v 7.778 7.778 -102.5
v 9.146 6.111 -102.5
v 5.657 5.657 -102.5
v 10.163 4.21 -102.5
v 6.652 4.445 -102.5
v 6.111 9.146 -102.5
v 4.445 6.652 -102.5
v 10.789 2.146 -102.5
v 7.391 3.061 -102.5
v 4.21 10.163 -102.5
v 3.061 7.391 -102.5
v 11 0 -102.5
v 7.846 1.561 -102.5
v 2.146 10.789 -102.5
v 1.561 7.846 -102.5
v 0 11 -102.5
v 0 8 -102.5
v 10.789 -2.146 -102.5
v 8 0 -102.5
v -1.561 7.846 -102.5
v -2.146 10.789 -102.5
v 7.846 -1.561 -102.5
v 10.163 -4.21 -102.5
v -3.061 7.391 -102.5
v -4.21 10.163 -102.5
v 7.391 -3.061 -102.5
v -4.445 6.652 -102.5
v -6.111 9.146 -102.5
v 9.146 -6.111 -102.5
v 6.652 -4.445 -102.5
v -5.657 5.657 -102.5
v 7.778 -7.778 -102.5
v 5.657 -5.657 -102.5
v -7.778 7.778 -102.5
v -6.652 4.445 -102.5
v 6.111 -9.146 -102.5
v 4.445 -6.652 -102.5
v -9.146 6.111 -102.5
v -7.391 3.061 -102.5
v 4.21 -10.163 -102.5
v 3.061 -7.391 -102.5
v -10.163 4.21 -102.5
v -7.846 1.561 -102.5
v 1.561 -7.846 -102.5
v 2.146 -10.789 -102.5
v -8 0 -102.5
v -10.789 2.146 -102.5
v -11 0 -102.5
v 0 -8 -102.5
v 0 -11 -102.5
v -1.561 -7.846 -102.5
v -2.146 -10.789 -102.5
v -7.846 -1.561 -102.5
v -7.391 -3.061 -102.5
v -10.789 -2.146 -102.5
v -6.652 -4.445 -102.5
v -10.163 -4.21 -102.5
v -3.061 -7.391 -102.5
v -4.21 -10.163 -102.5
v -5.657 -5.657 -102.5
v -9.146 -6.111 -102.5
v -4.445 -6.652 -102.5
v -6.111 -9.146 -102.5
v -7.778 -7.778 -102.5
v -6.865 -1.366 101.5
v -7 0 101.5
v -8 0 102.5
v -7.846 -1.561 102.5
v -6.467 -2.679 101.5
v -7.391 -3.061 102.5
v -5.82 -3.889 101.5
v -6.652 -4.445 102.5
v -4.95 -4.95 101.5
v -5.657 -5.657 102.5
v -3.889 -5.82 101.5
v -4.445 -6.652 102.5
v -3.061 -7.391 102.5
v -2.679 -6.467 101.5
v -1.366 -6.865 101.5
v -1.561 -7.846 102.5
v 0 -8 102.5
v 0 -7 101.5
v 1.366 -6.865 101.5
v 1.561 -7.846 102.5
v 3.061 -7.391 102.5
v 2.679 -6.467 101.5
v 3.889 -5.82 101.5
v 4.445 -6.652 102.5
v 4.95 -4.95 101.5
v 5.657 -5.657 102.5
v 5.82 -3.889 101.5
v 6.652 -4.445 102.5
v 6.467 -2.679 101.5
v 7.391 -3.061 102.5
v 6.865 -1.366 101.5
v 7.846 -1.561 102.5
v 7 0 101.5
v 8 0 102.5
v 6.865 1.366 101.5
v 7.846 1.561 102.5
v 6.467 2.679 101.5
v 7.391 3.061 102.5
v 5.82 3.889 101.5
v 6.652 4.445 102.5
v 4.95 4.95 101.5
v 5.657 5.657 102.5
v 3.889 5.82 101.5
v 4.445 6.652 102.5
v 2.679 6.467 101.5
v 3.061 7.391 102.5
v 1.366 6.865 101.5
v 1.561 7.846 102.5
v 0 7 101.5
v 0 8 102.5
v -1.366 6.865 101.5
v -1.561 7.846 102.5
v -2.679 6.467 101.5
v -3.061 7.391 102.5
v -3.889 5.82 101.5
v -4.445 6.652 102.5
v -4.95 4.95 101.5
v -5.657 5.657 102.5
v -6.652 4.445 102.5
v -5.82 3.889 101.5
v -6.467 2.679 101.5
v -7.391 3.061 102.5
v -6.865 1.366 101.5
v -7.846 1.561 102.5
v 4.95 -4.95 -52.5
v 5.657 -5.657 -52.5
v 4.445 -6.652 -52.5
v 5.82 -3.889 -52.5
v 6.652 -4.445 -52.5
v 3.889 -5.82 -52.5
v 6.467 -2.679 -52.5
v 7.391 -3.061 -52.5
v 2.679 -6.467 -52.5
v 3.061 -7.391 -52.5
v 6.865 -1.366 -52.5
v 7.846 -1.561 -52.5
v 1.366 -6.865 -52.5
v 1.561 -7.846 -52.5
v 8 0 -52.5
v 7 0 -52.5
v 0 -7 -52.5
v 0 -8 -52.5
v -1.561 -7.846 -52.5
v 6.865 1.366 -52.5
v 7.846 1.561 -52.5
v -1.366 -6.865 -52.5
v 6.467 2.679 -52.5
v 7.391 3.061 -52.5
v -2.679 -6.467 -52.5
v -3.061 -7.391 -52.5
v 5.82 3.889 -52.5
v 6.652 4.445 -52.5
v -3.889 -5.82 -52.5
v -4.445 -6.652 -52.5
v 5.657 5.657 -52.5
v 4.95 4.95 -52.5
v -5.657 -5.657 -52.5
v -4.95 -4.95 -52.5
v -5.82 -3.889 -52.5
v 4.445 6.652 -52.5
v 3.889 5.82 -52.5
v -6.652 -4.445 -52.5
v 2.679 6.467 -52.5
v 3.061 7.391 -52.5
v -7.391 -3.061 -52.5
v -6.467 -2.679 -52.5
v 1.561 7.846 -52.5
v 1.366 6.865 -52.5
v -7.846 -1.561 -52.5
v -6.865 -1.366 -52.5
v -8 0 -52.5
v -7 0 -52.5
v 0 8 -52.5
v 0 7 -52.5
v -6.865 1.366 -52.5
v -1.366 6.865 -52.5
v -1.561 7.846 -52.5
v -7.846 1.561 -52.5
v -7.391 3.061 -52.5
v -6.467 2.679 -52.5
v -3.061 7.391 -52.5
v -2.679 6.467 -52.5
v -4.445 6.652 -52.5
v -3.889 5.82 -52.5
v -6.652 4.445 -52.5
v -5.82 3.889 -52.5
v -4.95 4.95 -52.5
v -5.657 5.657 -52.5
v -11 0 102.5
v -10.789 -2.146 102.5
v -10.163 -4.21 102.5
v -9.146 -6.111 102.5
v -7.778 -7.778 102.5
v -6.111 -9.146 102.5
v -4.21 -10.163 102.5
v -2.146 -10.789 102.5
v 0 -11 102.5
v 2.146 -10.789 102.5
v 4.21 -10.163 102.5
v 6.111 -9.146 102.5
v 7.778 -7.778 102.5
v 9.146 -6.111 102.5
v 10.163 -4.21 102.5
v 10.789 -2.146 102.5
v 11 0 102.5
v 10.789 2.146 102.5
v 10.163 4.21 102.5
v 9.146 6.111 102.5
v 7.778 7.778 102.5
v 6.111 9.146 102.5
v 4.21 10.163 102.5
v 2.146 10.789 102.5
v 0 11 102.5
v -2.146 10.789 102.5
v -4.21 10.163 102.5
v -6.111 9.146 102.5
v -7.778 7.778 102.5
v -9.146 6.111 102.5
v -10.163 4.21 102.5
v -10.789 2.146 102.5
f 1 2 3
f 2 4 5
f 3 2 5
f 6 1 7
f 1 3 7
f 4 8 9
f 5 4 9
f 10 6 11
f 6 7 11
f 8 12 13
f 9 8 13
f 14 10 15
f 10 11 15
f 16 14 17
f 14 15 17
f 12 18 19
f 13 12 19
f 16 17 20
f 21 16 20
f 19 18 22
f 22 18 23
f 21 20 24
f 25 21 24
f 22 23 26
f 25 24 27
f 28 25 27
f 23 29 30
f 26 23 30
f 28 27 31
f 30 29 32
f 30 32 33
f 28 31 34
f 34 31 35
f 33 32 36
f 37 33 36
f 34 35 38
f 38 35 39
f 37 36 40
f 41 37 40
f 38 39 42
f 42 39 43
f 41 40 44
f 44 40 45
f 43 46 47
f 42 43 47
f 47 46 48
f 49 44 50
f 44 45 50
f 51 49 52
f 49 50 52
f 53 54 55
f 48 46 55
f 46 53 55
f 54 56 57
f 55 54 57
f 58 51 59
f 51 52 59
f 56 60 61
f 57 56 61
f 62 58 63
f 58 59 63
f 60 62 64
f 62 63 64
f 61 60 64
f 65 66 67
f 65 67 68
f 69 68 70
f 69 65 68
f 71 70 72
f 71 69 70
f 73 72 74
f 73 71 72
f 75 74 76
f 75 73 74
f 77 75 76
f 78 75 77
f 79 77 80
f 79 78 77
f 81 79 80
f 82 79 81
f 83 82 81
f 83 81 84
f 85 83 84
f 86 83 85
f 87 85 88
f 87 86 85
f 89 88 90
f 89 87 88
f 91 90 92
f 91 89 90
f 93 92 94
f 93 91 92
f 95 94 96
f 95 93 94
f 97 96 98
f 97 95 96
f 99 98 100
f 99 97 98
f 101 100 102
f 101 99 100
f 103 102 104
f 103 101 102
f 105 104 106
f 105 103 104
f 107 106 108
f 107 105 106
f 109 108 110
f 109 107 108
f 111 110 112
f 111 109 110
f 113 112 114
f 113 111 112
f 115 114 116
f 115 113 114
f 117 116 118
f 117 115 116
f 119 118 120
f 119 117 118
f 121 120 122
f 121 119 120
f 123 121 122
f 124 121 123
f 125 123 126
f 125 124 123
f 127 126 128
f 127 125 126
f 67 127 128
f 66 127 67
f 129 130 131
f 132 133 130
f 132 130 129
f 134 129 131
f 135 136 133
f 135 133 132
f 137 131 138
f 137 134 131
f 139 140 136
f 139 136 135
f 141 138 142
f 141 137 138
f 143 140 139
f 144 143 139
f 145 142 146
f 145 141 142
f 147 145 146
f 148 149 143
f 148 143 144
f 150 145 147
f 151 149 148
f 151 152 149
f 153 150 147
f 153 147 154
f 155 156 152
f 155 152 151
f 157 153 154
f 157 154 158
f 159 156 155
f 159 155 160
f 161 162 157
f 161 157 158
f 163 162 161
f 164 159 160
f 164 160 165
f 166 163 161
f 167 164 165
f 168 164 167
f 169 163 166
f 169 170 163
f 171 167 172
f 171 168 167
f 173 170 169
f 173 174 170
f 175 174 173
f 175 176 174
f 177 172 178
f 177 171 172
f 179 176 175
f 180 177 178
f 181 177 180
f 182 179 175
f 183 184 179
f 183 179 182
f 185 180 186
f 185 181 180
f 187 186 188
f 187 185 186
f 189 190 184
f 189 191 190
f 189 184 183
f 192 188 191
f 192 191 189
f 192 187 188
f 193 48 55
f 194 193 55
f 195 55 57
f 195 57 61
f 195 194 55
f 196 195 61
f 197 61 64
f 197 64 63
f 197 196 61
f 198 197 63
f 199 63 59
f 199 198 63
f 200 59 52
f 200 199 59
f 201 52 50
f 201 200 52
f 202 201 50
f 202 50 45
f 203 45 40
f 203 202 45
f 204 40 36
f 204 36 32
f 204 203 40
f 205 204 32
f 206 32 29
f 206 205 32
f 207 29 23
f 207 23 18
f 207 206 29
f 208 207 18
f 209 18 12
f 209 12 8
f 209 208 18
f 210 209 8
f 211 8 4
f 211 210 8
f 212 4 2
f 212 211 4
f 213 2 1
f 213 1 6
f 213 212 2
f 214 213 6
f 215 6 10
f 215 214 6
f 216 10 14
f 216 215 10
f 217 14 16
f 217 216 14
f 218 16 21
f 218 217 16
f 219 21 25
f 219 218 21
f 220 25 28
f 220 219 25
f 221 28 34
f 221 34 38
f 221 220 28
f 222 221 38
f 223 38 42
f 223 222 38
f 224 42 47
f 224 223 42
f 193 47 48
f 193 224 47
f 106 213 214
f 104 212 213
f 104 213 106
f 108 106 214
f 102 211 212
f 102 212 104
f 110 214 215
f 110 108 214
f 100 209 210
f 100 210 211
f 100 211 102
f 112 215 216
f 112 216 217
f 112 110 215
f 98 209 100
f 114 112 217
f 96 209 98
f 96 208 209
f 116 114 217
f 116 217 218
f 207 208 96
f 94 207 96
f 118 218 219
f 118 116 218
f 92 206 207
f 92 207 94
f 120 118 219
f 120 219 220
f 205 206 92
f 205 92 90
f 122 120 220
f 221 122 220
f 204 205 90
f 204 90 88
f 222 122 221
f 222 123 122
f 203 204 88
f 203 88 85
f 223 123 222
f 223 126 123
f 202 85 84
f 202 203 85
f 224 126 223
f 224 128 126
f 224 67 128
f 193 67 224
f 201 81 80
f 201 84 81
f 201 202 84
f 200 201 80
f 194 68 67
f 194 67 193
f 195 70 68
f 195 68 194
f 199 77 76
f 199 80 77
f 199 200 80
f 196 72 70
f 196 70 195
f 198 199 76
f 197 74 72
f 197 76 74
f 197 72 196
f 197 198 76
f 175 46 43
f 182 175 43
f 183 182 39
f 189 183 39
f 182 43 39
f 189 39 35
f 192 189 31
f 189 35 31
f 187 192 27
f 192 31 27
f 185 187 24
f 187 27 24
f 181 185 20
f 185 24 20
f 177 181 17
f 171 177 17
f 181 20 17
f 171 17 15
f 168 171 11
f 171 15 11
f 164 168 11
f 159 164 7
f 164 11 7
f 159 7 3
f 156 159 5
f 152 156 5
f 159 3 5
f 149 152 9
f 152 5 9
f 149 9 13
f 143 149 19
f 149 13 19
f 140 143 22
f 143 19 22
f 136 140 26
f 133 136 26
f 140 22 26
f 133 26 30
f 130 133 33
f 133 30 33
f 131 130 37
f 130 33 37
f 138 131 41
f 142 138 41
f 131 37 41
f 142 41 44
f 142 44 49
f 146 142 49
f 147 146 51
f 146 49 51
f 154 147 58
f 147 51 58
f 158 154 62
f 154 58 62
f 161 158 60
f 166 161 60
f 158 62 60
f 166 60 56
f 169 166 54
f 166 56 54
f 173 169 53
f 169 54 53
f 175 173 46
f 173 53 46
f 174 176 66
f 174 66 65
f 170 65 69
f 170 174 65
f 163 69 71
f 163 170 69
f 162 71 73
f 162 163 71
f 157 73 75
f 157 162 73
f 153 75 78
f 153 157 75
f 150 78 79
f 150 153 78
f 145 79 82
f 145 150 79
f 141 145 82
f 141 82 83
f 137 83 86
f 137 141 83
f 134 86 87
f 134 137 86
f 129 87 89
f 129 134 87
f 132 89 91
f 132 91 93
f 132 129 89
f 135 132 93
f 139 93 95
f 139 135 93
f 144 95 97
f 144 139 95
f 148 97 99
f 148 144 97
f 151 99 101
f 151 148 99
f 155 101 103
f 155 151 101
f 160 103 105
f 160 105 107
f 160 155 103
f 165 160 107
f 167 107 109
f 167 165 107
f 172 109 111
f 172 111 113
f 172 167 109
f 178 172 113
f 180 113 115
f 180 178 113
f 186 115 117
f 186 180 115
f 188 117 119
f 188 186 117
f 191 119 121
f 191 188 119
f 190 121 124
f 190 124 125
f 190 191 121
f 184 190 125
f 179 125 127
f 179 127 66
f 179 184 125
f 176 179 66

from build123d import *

# Parameters (mm, degrees)
SZKIC1_R                    = 11
SZKIC1_R_2                  = 7
DODANIE_WYCI_GNI_CIE1_DEPTH = 102.5
SZKIC2_R                    = 8
WYTNIJ_WYCI_GNI_CIE1_DEPTH  = 50
SFAZOWANIE1_SIZE            = 1


with BuildPart() as part:
    # Szkic1 → Dodanie-wyciągnięcie1 (new, symmetric)
    with BuildSketch(Plane.XY):
        with Locations(Location((0, 0, 0), (0, 0, 180))):
            Circle(SZKIC1_R)
        with Locations(Location((0, 0, 0), (0, 0, 180))):
            Circle(SZKIC1_R_2, mode=Mode.SUBTRACT)
    extrude(amount=DODANIE_WYCI_GNI_CIE1_DEPTH, both=True)

    # Szkic2 → Wytnij-wyciągnięcie1 (cut)
    with BuildSketch(Plane(origin=(0, 0, -102.5), x_dir=(-1, 0, 0), z_dir=(0, 0, -1))):
        Circle(SZKIC2_R)
    extrude(amount=-WYTNIJ_WYCI_GNI_CIE1_DEPTH, mode=Mode.SUBTRACT)

    # Sfazowanie1
    sfazowanie1_edges = [part.edges().sort_by_distance(p)[0] for p in [
        (7, 0, 102.5),
    ]]
    chamfer(sfazowanie1_edges, length=SFAZOWANIE1_SIZE)


solid = part.part
